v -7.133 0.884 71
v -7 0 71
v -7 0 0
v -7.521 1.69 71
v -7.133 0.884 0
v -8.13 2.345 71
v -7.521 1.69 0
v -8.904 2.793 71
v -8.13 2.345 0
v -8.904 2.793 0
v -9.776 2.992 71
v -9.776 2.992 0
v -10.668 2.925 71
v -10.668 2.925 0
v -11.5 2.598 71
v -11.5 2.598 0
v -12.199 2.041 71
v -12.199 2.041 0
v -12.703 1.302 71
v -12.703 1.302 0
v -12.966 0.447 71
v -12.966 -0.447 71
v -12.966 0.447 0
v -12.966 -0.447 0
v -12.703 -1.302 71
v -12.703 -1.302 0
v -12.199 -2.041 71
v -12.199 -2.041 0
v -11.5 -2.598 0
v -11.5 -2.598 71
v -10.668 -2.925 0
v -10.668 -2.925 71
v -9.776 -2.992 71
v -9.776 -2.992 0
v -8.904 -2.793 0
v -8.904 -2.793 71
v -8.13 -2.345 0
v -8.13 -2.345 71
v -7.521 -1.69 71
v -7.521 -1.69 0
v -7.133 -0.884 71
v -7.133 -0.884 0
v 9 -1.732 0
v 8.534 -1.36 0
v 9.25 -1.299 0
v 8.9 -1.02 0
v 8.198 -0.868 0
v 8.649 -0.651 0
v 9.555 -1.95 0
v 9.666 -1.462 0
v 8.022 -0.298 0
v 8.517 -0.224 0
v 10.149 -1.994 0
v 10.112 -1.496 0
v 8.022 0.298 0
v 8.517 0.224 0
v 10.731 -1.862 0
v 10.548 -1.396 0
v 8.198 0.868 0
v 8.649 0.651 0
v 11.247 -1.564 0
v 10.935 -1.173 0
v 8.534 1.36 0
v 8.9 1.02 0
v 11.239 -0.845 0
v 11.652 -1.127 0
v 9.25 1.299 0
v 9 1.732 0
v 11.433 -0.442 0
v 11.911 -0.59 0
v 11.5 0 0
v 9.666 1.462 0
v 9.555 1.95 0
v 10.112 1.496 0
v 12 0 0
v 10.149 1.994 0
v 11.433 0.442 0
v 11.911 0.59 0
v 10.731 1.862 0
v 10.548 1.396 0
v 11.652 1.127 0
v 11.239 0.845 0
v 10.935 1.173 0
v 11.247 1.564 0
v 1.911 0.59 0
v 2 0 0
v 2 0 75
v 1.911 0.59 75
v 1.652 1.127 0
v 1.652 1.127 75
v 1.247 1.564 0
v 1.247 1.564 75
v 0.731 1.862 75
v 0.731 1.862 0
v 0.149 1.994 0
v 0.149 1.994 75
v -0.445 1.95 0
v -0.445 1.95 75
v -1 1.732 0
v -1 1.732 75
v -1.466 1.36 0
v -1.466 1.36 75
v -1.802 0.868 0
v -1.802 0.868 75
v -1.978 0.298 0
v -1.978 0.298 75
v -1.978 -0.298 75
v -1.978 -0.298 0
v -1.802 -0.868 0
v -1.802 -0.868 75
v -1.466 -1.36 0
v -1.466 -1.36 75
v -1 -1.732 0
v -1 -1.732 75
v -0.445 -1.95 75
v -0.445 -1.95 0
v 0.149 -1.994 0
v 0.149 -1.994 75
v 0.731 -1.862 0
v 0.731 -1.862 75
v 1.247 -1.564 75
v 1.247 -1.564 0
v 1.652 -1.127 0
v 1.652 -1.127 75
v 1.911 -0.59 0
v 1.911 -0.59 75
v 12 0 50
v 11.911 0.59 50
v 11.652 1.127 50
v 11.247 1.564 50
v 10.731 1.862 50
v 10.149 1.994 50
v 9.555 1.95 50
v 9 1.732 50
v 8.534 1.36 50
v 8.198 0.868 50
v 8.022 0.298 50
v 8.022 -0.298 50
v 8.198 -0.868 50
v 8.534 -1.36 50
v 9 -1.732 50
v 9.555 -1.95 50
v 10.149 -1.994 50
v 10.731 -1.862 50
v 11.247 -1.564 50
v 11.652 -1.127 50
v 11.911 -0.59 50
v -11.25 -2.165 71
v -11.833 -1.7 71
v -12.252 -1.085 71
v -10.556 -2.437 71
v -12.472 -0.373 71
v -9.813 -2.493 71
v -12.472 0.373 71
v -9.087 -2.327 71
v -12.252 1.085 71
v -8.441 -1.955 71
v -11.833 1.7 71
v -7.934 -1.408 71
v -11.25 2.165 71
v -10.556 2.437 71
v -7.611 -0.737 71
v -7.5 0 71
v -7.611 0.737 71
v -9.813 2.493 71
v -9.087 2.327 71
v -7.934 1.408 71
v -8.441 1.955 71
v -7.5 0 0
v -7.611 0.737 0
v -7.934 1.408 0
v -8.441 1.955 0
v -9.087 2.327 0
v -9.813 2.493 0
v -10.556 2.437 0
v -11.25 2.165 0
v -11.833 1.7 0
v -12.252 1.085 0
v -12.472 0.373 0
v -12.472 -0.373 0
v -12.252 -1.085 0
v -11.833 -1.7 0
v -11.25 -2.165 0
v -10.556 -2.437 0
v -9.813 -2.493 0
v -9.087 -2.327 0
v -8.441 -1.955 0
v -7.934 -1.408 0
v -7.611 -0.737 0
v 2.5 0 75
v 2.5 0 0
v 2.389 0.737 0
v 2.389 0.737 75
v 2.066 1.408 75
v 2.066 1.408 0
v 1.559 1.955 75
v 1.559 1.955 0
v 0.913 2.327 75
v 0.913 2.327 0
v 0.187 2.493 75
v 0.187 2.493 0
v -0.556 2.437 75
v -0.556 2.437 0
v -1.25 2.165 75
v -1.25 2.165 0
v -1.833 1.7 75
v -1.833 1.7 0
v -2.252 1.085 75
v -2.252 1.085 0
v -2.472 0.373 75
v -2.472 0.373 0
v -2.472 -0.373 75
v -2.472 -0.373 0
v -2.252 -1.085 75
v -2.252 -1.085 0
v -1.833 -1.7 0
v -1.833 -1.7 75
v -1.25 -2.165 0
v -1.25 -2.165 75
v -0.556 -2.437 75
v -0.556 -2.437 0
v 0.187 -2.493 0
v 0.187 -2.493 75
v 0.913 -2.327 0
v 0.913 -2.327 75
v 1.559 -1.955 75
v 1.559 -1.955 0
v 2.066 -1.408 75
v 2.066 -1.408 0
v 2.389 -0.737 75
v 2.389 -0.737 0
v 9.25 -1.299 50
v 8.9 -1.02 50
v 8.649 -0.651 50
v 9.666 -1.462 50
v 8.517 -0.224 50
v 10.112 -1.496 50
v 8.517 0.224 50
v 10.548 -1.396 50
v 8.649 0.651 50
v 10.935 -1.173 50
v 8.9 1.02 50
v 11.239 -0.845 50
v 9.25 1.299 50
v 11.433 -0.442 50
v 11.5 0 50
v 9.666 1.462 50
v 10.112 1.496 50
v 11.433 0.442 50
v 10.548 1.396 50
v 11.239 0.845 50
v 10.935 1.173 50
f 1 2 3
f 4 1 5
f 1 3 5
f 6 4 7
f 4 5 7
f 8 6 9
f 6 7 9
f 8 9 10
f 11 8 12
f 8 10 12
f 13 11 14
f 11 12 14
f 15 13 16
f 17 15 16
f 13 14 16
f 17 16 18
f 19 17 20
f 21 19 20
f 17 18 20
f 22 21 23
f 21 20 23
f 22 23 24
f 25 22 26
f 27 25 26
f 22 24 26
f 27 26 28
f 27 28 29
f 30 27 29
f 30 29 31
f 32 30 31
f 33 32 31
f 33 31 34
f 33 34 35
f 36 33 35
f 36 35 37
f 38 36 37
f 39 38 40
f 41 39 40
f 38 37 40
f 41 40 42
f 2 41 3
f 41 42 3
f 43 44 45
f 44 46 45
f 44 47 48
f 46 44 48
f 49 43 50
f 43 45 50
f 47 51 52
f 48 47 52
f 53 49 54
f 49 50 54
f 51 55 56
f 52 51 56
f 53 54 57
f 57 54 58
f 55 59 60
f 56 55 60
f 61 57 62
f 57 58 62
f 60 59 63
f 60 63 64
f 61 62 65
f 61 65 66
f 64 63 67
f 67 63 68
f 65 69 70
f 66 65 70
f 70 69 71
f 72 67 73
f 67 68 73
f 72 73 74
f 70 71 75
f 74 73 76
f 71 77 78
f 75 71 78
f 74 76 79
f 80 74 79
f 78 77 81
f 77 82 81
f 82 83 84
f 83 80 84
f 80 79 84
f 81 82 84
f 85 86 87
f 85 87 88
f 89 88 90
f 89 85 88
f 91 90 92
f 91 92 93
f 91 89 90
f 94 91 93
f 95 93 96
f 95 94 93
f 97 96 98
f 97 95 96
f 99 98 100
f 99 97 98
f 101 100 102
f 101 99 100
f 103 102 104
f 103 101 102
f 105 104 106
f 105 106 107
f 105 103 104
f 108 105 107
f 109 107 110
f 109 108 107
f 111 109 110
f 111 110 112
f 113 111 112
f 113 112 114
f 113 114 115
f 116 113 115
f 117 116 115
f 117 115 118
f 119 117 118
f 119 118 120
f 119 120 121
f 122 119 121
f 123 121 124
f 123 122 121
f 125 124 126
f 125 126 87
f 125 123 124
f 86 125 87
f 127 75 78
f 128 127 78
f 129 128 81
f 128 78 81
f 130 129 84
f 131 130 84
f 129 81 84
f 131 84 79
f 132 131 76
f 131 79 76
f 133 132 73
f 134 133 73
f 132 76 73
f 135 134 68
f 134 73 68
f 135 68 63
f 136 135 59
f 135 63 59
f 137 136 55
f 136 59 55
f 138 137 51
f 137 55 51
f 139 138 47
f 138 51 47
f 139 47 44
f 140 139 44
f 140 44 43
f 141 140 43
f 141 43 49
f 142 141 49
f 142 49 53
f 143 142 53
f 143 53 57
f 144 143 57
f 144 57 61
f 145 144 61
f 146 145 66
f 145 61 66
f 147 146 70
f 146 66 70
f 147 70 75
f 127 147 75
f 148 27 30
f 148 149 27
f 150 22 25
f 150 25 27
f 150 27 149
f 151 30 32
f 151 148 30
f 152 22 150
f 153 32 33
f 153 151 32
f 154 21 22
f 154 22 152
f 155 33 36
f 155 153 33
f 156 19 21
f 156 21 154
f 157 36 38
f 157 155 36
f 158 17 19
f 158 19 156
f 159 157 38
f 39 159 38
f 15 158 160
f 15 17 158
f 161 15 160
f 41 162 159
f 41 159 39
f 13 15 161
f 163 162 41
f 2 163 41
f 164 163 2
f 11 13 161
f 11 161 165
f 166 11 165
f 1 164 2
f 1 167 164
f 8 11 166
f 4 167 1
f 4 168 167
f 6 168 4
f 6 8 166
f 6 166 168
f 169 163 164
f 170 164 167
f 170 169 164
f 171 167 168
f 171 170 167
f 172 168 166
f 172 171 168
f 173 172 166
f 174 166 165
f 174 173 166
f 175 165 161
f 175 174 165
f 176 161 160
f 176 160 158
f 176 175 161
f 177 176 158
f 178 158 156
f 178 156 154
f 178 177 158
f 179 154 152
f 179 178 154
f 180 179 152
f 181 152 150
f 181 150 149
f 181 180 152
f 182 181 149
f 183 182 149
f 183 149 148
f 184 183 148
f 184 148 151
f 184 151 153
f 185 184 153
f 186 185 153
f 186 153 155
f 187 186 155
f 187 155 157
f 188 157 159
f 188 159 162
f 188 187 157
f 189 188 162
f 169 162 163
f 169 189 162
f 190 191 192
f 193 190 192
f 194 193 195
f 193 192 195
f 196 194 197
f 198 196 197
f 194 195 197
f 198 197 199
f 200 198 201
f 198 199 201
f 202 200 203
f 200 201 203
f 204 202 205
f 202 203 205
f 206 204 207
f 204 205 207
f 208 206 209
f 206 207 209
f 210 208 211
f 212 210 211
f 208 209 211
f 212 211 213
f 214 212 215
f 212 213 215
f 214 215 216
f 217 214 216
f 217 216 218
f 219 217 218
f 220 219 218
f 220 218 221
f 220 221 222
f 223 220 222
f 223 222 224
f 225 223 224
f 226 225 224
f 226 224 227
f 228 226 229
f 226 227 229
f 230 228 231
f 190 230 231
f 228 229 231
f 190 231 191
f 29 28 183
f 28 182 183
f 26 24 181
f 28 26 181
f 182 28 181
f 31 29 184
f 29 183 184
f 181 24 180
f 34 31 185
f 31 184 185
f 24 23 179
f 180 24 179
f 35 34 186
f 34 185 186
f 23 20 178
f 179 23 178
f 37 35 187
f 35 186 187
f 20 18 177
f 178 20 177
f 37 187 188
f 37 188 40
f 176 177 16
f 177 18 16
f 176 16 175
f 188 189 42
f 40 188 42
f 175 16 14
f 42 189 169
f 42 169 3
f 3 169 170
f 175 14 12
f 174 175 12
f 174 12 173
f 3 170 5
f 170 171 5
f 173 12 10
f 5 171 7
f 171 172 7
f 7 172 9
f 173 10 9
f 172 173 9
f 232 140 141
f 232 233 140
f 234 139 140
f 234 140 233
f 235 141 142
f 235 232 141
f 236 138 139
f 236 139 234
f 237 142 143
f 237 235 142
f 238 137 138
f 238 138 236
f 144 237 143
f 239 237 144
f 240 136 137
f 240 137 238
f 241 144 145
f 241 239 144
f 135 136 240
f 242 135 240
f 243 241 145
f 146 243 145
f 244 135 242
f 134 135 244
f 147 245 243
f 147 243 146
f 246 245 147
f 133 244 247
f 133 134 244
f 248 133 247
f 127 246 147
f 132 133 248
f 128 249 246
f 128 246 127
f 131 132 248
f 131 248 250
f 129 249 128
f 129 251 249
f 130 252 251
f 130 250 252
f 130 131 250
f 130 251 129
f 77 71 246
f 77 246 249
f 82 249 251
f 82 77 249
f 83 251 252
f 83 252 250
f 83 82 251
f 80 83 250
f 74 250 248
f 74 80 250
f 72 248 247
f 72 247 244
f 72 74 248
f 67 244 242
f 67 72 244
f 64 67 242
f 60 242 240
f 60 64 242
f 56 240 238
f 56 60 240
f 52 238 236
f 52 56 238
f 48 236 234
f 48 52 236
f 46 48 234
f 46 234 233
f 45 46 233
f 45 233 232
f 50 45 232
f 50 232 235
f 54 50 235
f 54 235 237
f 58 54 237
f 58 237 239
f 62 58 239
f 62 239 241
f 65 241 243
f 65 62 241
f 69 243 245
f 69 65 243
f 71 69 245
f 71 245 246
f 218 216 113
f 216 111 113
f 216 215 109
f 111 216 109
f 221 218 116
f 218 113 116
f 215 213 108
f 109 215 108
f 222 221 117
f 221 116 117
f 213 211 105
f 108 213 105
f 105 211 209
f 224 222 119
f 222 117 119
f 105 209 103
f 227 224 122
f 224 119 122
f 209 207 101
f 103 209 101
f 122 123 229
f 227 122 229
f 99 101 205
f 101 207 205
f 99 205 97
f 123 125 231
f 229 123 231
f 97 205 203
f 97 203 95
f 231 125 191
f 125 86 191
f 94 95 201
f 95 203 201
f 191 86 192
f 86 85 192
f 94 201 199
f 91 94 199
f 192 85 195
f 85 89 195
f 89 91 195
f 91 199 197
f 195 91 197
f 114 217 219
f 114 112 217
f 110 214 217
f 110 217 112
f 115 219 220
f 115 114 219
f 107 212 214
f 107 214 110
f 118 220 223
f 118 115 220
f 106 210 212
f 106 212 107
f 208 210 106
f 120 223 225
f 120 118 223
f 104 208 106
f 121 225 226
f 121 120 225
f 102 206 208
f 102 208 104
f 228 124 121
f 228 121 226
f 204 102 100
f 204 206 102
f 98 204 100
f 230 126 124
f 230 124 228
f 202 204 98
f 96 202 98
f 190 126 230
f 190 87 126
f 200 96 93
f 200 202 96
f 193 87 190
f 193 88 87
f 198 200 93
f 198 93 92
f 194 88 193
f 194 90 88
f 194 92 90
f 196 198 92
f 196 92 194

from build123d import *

# Parameters (mm, degrees)
F0_R     = 3
F0_R_2   = 2.5
F1_DEPTH = 71
F3_R     = 2
F3_R_2   = 1.5
F4_DEPTH = 50
F2_R     = 2.5
F2_R_2   = 2
F5_DEPTH = 75


with BuildPart() as f1:
    # F0 (on Top) → F1 (new body)
    with BuildSketch(Plane.XY):
        with Locations((-10, 0)):
            Circle(F0_R)
        with Locations((-10, 0)):
            Circle(F0_R_2, mode=Mode.SUBTRACT)
    extrude(amount=F1_DEPTH)


with BuildPart() as f4:
    # F3 (on Top) → F4 (new body)
    with BuildSketch(Plane.XY):
        with Locations((10, 0)):
            Circle(F3_R)
        with Locations((10, 0)):
            Circle(F3_R_2, mode=Mode.SUBTRACT)
    extrude(amount=F4_DEPTH)


with BuildPart() as f5:
    # F2 (on Top) → F5 (new body)
    with BuildSketch(Plane.XY):
        Circle(F2_R)
        Circle(F2_R_2, mode=Mode.SUBTRACT)
    extrude(amount=F5_DEPTH)


solid = Compound([f1.part, f4.part, f5.part])
